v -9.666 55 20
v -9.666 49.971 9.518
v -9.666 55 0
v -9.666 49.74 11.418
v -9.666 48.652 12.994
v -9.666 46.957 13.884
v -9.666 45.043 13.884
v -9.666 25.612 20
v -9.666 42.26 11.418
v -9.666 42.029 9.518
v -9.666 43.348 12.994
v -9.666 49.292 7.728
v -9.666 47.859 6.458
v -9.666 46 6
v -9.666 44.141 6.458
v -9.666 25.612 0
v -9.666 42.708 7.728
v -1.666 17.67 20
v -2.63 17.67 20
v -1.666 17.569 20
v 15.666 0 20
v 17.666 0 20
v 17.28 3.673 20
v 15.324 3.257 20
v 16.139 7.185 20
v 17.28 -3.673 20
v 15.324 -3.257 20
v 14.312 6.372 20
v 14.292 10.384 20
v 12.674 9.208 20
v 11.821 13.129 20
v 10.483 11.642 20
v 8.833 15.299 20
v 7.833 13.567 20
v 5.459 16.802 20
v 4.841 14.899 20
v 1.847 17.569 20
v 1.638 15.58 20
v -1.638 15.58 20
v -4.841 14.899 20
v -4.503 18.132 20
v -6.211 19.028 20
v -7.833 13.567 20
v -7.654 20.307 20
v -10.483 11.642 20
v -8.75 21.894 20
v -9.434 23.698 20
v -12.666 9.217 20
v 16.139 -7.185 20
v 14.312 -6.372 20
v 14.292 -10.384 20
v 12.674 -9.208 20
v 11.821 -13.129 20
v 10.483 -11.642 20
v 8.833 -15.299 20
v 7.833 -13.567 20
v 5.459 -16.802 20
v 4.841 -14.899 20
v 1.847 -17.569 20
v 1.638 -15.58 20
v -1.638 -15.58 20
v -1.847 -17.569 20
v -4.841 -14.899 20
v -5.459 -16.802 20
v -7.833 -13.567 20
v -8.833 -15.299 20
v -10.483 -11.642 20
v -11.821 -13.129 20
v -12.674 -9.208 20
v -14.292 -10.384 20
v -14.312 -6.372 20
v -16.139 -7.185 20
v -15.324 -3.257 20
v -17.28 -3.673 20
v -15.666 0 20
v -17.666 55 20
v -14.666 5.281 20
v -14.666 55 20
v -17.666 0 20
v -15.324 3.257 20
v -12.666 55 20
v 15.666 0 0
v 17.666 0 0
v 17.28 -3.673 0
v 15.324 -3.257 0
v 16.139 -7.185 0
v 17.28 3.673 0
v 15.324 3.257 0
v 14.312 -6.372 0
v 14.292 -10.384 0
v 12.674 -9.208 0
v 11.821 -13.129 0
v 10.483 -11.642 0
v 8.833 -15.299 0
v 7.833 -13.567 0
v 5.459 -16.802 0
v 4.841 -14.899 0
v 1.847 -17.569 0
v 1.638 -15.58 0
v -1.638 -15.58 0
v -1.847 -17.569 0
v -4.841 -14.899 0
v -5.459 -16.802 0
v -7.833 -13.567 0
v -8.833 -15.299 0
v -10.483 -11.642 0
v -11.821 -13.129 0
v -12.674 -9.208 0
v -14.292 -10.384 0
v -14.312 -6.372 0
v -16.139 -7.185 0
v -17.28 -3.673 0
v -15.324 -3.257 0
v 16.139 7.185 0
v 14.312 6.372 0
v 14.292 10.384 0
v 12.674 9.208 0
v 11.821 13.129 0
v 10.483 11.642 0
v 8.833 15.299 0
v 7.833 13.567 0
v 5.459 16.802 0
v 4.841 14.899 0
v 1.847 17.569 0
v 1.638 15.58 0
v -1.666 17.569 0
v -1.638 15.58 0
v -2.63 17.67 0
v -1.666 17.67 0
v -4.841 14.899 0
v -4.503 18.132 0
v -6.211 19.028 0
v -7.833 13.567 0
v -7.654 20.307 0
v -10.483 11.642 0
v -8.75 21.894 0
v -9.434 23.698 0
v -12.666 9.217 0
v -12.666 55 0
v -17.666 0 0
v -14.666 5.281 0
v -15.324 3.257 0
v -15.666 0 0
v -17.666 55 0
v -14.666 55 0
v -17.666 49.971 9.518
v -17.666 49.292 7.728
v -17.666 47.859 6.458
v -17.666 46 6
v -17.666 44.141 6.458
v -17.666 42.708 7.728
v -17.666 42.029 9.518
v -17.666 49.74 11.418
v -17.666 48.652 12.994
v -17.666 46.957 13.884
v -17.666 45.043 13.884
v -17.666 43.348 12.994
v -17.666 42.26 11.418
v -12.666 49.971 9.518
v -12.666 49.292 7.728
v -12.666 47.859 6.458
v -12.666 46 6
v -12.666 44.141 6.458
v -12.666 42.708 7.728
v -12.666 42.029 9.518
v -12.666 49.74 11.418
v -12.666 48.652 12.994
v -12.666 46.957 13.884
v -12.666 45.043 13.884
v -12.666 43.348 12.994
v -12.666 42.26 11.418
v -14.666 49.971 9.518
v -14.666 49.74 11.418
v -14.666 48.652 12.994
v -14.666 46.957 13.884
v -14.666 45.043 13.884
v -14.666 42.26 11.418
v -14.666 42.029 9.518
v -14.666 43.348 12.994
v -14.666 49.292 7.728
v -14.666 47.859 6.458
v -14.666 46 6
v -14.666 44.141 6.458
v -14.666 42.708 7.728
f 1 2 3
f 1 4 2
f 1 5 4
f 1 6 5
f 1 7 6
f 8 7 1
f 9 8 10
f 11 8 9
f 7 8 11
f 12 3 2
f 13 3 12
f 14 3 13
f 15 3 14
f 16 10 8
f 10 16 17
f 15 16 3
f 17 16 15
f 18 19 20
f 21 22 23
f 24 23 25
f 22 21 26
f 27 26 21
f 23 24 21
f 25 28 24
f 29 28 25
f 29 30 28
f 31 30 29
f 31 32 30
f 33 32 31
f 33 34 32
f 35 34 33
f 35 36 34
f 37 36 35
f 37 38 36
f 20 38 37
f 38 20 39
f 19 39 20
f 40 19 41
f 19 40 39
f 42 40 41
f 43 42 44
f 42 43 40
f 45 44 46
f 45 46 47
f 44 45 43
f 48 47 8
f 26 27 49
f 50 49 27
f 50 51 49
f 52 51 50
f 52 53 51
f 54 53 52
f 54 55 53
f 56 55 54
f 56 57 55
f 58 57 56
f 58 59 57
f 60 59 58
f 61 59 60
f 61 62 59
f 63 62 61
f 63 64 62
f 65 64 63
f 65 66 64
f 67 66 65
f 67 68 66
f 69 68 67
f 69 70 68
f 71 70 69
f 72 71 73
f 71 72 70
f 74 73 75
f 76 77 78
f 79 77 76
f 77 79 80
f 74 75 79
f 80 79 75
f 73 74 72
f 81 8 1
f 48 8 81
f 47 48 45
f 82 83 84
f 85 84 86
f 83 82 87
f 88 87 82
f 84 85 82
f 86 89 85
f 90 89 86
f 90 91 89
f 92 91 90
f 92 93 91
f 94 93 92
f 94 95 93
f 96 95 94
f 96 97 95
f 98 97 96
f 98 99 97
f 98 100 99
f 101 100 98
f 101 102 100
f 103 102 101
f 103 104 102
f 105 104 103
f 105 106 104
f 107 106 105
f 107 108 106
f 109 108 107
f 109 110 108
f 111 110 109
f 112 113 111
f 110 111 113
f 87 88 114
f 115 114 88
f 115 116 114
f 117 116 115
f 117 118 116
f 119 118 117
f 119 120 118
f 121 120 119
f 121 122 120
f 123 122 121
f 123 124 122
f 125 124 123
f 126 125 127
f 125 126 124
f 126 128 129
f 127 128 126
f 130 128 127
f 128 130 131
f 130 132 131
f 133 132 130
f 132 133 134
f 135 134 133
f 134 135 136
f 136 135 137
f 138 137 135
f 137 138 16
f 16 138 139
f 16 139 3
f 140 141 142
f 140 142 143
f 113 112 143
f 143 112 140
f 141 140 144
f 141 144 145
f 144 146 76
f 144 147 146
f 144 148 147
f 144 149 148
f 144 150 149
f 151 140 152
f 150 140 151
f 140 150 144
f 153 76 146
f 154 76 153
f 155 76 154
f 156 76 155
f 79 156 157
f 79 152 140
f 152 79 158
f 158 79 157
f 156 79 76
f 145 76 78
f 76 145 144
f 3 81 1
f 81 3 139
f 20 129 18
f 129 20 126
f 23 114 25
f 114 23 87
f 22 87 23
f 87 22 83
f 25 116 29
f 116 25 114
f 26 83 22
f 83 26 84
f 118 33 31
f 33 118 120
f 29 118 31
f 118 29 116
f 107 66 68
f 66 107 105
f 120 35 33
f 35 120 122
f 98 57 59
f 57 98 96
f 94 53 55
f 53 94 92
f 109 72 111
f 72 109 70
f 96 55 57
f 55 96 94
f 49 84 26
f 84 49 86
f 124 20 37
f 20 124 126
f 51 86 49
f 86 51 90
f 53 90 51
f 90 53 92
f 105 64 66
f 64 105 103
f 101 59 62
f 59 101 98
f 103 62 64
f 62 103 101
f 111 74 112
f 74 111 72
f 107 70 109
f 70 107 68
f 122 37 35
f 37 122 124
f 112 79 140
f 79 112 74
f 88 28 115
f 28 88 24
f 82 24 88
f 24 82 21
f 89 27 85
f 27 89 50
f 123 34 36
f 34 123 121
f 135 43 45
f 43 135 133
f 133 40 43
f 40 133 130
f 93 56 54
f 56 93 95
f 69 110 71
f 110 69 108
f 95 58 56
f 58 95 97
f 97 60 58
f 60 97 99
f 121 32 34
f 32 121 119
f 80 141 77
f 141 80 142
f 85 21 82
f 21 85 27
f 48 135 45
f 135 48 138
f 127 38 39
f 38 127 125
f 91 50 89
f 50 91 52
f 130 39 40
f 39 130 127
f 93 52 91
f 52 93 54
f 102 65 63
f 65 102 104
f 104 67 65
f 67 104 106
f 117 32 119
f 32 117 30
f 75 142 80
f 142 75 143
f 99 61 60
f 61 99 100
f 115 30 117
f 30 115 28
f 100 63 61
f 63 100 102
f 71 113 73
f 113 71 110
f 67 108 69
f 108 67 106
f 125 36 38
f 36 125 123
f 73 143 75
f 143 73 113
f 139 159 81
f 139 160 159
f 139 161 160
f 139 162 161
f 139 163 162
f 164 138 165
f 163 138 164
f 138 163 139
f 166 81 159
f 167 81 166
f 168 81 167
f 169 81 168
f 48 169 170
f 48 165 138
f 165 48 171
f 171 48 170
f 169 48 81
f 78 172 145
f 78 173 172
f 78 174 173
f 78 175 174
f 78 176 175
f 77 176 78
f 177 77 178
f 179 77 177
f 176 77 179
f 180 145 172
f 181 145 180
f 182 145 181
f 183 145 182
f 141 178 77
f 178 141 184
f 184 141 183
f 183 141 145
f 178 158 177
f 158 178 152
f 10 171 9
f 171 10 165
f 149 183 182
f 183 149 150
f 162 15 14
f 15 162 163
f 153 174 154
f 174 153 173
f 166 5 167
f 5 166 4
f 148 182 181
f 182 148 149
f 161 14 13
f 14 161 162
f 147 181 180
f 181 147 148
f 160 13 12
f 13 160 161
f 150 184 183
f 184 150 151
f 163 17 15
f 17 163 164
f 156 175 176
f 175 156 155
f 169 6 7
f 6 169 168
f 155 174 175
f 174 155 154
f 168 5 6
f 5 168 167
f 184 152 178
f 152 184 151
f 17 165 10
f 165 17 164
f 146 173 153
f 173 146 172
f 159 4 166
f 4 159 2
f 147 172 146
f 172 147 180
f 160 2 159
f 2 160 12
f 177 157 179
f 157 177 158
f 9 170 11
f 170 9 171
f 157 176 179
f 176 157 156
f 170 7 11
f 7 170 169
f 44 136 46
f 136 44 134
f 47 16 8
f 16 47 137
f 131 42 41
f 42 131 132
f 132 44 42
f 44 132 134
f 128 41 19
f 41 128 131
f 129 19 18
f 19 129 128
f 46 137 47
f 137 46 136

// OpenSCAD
// Copyright 2019 Marcos Del Sol Vives
// SPDX-License-Identifier: ISC

inner_radius = 111 / PI / 2 - 2;

outer_radius = inner_radius + 2;

ring_height = 20;

tab_to_center = outer_radius;

tab_thickness = 3;

tab_spacing = 2;

tab_length = 55;

tab_alpha = asin(tab_to_center / outer_radius);
tab_y = outer_radius * cos(tab_alpha);

screw_diameter = 4;
screw_margin = 5;

tab_bb_x = -tab_to_center + tab_spacing + 2 * tab_thickness;

support_radius = 8;
support_x = tab_bb_x + support_radius;
support_y = sqrt(pow(outer_radius + support_radius, 2) - pow(support_x, 2));
echo([support_x, support_y]);

difference() {
	union() {
		cylinder(r=outer_radius, h=ring_height);

		translate([-tab_to_center, 0, 0]) {
			cube([tab_thickness + tab_spacing + tab_thickness, tab_y + tab_length, ring_height]);
			cube([tab_to_center + support_x, support_y, ring_height]);
		}
	}

	cylinder(r = inner_radius, h = ring_height);
	translate([-tab_to_center + tab_thickness, 0, 0]) {
		cube([tab_spacing, tab_y + tab_length, ring_height]);
	}

	translate([-tab_to_center - 0.1, tab_y + tab_length - screw_diameter - screw_margin, ring_height / 2])
		rotate([0, 90, 0])
			cylinder(r = screw_diameter, h=tab_spacing + tab_thickness * 2 + 0.2);

	translate([support_x, support_y]) {
		cylinder(r=support_radius, h=ring_height);
	}
}
